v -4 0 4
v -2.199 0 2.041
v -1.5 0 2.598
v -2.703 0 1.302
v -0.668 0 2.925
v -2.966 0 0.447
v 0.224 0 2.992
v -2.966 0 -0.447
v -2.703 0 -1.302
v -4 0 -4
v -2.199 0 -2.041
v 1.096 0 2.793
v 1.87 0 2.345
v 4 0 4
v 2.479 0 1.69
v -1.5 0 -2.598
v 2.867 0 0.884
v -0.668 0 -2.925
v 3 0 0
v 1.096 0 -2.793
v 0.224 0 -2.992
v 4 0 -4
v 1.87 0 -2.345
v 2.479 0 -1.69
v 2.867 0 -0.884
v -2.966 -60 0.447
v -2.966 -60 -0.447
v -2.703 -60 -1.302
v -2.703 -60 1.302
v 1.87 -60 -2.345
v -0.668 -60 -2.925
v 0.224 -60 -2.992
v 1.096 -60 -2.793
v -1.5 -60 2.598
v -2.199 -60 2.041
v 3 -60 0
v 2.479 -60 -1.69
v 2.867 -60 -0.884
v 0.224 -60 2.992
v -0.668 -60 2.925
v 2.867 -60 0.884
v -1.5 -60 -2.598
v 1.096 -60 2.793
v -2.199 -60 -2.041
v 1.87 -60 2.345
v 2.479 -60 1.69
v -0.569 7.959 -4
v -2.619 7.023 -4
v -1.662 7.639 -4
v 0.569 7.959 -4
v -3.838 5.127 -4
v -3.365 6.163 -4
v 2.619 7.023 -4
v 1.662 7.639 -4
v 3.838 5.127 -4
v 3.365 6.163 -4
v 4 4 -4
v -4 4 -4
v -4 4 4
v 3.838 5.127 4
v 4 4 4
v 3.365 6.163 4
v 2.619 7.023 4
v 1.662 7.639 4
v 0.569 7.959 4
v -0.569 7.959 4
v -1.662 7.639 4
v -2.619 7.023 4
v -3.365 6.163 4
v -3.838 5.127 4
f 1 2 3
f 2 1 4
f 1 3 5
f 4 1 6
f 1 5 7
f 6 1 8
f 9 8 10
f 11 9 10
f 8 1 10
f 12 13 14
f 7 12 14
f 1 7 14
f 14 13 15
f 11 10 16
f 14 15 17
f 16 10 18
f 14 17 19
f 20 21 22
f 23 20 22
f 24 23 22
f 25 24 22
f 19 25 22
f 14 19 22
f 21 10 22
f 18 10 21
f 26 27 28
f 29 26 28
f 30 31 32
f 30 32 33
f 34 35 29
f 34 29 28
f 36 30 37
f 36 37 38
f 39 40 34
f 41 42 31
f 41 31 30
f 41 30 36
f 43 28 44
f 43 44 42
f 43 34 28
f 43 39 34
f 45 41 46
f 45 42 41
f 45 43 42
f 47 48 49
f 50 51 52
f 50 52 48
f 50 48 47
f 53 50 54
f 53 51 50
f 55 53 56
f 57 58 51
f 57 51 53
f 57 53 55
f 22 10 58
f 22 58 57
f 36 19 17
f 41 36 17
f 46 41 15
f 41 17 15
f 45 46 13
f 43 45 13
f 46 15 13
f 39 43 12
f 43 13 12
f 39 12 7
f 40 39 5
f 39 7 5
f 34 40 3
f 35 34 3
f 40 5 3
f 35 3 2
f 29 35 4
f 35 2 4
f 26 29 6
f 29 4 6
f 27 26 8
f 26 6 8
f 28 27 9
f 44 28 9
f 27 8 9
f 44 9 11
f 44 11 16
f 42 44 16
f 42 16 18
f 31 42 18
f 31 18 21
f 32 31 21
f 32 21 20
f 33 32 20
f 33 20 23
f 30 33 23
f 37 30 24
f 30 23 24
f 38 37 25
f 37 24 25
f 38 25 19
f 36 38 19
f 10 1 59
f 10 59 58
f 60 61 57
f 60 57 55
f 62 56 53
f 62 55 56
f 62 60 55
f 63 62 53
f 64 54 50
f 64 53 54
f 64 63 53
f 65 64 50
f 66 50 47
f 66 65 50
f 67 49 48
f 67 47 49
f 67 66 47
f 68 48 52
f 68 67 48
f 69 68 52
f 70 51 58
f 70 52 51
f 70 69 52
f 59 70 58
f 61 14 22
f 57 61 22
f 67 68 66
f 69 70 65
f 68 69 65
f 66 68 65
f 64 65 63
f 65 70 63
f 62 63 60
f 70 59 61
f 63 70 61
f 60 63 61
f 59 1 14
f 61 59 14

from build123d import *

# Parameters (mm, degrees)
SKETCH_1_W          = 8
SKETCH_1_H          = 8
EXTRUDE_1_DEPTH     = 8
CUT_EXTRUDE_1_DEPTH = 8
SKETCH_3_R          = 3
EXTRUDE_2_DEPTH     = 60


with BuildPart() as part:
    # 草图1 → 凸台-拉伸1 (new body)
    with BuildSketch(Plane(origin=(0, 0, 0), x_dir=(1, 0, 0), z_dir=(0, 1, 0))):
        Rectangle(SKETCH_1_W, SKETCH_1_H)
    extrude(amount=EXTRUDE_1_DEPTH)

    # 草图2 → 切除-拉伸1 (cut)
    with BuildSketch(Plane.XY.offset(4)):
        with BuildLine():
            Line((-4, 4), (-4, 9.423328326))
            Line((-4, 9.423328326), (4, 9.423328326))
            Line((4, 9.423328326), (4, 4))
            ThreePointArc((4, 4), (0, 8), (-4, 4))
        make_face()
    extrude(amount=-CUT_EXTRUDE_1_DEPTH, mode=Mode.SUBTRACT)

    # 草图3 → 凸台-拉伸2 (add)
    with BuildSketch(Plane.XZ):
        Circle(SKETCH_3_R)
    extrude(amount=EXTRUDE_2_DEPTH)


solid = part.part
